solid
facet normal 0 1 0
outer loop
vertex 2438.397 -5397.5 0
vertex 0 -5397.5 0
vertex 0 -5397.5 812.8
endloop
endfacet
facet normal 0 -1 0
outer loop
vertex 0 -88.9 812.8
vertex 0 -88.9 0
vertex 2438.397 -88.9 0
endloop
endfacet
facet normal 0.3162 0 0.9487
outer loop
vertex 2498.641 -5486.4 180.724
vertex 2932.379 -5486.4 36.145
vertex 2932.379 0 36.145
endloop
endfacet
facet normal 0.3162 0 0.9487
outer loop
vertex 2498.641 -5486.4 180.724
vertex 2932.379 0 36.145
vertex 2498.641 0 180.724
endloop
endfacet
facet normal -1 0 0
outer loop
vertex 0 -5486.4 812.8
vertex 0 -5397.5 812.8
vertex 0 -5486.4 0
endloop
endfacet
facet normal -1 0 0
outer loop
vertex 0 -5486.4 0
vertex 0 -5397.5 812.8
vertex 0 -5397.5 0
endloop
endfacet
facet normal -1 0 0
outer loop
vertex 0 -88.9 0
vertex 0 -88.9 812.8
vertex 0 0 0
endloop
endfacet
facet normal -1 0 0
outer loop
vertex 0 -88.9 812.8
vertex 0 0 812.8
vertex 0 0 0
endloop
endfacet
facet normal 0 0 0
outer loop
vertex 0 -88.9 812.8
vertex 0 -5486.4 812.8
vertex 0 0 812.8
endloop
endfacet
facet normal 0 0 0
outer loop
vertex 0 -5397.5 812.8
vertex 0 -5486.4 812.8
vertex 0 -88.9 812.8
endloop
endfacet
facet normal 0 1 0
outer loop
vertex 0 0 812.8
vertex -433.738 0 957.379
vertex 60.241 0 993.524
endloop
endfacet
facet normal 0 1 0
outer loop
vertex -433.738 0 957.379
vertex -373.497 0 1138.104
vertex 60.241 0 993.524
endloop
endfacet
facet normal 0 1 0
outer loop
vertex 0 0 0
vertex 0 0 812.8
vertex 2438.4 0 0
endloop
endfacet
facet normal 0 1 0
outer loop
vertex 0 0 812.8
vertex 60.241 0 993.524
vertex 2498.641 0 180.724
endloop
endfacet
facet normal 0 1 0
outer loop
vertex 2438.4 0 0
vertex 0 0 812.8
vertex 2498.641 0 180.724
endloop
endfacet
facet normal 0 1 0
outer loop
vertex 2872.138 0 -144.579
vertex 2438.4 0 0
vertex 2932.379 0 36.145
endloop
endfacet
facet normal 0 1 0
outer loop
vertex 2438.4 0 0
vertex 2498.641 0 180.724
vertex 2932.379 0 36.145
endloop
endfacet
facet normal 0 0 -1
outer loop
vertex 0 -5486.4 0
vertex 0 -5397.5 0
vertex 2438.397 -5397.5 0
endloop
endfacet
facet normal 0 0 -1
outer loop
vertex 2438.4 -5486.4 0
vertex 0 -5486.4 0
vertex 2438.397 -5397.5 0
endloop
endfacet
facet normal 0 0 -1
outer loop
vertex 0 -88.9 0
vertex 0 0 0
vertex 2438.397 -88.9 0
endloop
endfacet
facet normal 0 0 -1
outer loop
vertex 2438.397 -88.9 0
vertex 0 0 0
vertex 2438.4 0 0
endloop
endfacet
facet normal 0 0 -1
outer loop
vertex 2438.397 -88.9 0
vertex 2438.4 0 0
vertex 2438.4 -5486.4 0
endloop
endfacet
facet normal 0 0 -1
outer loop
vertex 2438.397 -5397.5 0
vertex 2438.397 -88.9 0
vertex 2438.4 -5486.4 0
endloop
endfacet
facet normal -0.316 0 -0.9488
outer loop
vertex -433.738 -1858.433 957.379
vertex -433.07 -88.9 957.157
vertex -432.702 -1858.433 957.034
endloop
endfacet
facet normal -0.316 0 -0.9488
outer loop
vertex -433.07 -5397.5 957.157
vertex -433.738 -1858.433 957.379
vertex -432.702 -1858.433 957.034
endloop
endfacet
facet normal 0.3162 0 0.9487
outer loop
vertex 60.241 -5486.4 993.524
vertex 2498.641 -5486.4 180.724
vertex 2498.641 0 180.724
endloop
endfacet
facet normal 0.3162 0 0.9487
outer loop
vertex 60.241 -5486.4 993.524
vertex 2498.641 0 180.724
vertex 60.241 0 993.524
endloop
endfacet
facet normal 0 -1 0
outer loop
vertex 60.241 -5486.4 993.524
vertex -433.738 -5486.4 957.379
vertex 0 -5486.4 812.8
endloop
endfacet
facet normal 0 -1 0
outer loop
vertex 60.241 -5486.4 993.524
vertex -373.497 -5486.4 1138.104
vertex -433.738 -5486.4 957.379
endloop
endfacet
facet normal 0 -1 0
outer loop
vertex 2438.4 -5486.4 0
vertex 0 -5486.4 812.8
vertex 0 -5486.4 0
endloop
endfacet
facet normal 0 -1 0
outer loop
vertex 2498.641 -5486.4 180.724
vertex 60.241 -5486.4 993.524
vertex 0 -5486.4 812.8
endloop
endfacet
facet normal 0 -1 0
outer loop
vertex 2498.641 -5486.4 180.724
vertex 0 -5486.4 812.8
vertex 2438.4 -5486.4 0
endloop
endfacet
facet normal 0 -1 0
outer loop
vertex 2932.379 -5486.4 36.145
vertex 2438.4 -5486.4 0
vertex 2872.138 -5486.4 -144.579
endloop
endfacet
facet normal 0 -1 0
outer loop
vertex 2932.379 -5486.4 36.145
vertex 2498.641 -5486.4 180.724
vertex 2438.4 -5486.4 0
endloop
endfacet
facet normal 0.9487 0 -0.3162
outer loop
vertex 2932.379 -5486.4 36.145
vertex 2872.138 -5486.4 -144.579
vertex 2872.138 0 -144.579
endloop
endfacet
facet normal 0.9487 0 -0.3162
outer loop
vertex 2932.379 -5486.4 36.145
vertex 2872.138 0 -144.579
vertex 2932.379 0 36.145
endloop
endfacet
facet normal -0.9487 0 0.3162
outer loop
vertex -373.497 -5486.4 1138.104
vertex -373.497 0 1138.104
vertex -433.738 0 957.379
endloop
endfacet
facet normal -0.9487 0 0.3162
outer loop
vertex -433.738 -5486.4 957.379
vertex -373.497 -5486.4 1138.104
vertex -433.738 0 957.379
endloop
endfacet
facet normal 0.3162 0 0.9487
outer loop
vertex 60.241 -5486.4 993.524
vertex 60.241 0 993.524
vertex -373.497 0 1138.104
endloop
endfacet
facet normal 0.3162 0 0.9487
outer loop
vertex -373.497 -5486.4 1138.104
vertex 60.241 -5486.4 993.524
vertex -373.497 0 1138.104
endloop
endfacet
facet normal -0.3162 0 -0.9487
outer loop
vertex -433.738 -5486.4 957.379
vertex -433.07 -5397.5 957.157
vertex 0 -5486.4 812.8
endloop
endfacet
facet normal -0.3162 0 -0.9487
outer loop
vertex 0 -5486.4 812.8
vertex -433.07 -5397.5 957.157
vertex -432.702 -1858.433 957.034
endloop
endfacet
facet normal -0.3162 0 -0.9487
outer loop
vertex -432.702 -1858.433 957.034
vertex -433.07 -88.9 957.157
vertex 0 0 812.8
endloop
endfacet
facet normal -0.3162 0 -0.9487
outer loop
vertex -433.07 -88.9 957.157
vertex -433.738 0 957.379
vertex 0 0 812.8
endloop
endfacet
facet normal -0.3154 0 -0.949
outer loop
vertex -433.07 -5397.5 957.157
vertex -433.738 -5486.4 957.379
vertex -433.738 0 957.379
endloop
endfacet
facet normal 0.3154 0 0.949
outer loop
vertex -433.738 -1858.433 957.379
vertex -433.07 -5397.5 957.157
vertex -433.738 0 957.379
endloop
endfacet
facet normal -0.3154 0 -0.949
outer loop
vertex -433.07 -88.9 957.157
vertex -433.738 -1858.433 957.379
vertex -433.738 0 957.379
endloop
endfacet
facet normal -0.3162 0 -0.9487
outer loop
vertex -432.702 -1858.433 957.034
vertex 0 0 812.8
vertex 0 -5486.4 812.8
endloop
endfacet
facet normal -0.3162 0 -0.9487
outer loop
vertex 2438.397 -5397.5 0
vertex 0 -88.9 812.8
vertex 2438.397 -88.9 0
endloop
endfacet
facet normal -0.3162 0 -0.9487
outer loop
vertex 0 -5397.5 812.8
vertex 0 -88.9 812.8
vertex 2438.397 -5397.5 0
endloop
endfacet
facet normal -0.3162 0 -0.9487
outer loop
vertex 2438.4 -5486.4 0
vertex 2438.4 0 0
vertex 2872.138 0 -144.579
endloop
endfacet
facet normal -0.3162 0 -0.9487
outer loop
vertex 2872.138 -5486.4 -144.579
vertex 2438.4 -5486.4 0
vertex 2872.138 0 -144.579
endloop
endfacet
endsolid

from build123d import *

# Parameters (mm, degrees)
F1_DEPTH = 5486.4
F2_W     = 5308.6
F2_H     = 812.8
F3_DEPTH = 3352.8


with BuildPart() as f1:
    # F0 (on Front) → F1 (new body)
    with BuildSketch(Plane.XZ):
        Polygon((-433.738004, 957.379335), (0, 812.8), (60.241389, 993.524168), (-373.496614, 1138.103503), align=None)
        Polygon((0, 812.8), (2438.4, 0), (2498.641389, 180.724168), (60.241389, 993.524168), align=None)
        Polygon((2498.641389, 180.724168), (2438.4, 0), (2872.138004, -144.579335), (2932.379393, 36.144834), align=None)
        Polygon((0, 812.8), (0, 0), (2438.4, 0), align=None)
    extrude(amount=F1_DEPTH)

    # F2 (on face) → F3 (cut)
    with BuildSketch(Plane(origin=(-677.578004, 0, 225.859335), x_dir=(0, -1, 0), z_dir=(-0.948683, 0, 0.316228))):
        with Locations((2743.2, 364.689785)):
            Rectangle(F2_W, F2_H)
    extrude(amount=-F3_DEPTH, mode=Mode.SUBTRACT)


solid = f1.part
